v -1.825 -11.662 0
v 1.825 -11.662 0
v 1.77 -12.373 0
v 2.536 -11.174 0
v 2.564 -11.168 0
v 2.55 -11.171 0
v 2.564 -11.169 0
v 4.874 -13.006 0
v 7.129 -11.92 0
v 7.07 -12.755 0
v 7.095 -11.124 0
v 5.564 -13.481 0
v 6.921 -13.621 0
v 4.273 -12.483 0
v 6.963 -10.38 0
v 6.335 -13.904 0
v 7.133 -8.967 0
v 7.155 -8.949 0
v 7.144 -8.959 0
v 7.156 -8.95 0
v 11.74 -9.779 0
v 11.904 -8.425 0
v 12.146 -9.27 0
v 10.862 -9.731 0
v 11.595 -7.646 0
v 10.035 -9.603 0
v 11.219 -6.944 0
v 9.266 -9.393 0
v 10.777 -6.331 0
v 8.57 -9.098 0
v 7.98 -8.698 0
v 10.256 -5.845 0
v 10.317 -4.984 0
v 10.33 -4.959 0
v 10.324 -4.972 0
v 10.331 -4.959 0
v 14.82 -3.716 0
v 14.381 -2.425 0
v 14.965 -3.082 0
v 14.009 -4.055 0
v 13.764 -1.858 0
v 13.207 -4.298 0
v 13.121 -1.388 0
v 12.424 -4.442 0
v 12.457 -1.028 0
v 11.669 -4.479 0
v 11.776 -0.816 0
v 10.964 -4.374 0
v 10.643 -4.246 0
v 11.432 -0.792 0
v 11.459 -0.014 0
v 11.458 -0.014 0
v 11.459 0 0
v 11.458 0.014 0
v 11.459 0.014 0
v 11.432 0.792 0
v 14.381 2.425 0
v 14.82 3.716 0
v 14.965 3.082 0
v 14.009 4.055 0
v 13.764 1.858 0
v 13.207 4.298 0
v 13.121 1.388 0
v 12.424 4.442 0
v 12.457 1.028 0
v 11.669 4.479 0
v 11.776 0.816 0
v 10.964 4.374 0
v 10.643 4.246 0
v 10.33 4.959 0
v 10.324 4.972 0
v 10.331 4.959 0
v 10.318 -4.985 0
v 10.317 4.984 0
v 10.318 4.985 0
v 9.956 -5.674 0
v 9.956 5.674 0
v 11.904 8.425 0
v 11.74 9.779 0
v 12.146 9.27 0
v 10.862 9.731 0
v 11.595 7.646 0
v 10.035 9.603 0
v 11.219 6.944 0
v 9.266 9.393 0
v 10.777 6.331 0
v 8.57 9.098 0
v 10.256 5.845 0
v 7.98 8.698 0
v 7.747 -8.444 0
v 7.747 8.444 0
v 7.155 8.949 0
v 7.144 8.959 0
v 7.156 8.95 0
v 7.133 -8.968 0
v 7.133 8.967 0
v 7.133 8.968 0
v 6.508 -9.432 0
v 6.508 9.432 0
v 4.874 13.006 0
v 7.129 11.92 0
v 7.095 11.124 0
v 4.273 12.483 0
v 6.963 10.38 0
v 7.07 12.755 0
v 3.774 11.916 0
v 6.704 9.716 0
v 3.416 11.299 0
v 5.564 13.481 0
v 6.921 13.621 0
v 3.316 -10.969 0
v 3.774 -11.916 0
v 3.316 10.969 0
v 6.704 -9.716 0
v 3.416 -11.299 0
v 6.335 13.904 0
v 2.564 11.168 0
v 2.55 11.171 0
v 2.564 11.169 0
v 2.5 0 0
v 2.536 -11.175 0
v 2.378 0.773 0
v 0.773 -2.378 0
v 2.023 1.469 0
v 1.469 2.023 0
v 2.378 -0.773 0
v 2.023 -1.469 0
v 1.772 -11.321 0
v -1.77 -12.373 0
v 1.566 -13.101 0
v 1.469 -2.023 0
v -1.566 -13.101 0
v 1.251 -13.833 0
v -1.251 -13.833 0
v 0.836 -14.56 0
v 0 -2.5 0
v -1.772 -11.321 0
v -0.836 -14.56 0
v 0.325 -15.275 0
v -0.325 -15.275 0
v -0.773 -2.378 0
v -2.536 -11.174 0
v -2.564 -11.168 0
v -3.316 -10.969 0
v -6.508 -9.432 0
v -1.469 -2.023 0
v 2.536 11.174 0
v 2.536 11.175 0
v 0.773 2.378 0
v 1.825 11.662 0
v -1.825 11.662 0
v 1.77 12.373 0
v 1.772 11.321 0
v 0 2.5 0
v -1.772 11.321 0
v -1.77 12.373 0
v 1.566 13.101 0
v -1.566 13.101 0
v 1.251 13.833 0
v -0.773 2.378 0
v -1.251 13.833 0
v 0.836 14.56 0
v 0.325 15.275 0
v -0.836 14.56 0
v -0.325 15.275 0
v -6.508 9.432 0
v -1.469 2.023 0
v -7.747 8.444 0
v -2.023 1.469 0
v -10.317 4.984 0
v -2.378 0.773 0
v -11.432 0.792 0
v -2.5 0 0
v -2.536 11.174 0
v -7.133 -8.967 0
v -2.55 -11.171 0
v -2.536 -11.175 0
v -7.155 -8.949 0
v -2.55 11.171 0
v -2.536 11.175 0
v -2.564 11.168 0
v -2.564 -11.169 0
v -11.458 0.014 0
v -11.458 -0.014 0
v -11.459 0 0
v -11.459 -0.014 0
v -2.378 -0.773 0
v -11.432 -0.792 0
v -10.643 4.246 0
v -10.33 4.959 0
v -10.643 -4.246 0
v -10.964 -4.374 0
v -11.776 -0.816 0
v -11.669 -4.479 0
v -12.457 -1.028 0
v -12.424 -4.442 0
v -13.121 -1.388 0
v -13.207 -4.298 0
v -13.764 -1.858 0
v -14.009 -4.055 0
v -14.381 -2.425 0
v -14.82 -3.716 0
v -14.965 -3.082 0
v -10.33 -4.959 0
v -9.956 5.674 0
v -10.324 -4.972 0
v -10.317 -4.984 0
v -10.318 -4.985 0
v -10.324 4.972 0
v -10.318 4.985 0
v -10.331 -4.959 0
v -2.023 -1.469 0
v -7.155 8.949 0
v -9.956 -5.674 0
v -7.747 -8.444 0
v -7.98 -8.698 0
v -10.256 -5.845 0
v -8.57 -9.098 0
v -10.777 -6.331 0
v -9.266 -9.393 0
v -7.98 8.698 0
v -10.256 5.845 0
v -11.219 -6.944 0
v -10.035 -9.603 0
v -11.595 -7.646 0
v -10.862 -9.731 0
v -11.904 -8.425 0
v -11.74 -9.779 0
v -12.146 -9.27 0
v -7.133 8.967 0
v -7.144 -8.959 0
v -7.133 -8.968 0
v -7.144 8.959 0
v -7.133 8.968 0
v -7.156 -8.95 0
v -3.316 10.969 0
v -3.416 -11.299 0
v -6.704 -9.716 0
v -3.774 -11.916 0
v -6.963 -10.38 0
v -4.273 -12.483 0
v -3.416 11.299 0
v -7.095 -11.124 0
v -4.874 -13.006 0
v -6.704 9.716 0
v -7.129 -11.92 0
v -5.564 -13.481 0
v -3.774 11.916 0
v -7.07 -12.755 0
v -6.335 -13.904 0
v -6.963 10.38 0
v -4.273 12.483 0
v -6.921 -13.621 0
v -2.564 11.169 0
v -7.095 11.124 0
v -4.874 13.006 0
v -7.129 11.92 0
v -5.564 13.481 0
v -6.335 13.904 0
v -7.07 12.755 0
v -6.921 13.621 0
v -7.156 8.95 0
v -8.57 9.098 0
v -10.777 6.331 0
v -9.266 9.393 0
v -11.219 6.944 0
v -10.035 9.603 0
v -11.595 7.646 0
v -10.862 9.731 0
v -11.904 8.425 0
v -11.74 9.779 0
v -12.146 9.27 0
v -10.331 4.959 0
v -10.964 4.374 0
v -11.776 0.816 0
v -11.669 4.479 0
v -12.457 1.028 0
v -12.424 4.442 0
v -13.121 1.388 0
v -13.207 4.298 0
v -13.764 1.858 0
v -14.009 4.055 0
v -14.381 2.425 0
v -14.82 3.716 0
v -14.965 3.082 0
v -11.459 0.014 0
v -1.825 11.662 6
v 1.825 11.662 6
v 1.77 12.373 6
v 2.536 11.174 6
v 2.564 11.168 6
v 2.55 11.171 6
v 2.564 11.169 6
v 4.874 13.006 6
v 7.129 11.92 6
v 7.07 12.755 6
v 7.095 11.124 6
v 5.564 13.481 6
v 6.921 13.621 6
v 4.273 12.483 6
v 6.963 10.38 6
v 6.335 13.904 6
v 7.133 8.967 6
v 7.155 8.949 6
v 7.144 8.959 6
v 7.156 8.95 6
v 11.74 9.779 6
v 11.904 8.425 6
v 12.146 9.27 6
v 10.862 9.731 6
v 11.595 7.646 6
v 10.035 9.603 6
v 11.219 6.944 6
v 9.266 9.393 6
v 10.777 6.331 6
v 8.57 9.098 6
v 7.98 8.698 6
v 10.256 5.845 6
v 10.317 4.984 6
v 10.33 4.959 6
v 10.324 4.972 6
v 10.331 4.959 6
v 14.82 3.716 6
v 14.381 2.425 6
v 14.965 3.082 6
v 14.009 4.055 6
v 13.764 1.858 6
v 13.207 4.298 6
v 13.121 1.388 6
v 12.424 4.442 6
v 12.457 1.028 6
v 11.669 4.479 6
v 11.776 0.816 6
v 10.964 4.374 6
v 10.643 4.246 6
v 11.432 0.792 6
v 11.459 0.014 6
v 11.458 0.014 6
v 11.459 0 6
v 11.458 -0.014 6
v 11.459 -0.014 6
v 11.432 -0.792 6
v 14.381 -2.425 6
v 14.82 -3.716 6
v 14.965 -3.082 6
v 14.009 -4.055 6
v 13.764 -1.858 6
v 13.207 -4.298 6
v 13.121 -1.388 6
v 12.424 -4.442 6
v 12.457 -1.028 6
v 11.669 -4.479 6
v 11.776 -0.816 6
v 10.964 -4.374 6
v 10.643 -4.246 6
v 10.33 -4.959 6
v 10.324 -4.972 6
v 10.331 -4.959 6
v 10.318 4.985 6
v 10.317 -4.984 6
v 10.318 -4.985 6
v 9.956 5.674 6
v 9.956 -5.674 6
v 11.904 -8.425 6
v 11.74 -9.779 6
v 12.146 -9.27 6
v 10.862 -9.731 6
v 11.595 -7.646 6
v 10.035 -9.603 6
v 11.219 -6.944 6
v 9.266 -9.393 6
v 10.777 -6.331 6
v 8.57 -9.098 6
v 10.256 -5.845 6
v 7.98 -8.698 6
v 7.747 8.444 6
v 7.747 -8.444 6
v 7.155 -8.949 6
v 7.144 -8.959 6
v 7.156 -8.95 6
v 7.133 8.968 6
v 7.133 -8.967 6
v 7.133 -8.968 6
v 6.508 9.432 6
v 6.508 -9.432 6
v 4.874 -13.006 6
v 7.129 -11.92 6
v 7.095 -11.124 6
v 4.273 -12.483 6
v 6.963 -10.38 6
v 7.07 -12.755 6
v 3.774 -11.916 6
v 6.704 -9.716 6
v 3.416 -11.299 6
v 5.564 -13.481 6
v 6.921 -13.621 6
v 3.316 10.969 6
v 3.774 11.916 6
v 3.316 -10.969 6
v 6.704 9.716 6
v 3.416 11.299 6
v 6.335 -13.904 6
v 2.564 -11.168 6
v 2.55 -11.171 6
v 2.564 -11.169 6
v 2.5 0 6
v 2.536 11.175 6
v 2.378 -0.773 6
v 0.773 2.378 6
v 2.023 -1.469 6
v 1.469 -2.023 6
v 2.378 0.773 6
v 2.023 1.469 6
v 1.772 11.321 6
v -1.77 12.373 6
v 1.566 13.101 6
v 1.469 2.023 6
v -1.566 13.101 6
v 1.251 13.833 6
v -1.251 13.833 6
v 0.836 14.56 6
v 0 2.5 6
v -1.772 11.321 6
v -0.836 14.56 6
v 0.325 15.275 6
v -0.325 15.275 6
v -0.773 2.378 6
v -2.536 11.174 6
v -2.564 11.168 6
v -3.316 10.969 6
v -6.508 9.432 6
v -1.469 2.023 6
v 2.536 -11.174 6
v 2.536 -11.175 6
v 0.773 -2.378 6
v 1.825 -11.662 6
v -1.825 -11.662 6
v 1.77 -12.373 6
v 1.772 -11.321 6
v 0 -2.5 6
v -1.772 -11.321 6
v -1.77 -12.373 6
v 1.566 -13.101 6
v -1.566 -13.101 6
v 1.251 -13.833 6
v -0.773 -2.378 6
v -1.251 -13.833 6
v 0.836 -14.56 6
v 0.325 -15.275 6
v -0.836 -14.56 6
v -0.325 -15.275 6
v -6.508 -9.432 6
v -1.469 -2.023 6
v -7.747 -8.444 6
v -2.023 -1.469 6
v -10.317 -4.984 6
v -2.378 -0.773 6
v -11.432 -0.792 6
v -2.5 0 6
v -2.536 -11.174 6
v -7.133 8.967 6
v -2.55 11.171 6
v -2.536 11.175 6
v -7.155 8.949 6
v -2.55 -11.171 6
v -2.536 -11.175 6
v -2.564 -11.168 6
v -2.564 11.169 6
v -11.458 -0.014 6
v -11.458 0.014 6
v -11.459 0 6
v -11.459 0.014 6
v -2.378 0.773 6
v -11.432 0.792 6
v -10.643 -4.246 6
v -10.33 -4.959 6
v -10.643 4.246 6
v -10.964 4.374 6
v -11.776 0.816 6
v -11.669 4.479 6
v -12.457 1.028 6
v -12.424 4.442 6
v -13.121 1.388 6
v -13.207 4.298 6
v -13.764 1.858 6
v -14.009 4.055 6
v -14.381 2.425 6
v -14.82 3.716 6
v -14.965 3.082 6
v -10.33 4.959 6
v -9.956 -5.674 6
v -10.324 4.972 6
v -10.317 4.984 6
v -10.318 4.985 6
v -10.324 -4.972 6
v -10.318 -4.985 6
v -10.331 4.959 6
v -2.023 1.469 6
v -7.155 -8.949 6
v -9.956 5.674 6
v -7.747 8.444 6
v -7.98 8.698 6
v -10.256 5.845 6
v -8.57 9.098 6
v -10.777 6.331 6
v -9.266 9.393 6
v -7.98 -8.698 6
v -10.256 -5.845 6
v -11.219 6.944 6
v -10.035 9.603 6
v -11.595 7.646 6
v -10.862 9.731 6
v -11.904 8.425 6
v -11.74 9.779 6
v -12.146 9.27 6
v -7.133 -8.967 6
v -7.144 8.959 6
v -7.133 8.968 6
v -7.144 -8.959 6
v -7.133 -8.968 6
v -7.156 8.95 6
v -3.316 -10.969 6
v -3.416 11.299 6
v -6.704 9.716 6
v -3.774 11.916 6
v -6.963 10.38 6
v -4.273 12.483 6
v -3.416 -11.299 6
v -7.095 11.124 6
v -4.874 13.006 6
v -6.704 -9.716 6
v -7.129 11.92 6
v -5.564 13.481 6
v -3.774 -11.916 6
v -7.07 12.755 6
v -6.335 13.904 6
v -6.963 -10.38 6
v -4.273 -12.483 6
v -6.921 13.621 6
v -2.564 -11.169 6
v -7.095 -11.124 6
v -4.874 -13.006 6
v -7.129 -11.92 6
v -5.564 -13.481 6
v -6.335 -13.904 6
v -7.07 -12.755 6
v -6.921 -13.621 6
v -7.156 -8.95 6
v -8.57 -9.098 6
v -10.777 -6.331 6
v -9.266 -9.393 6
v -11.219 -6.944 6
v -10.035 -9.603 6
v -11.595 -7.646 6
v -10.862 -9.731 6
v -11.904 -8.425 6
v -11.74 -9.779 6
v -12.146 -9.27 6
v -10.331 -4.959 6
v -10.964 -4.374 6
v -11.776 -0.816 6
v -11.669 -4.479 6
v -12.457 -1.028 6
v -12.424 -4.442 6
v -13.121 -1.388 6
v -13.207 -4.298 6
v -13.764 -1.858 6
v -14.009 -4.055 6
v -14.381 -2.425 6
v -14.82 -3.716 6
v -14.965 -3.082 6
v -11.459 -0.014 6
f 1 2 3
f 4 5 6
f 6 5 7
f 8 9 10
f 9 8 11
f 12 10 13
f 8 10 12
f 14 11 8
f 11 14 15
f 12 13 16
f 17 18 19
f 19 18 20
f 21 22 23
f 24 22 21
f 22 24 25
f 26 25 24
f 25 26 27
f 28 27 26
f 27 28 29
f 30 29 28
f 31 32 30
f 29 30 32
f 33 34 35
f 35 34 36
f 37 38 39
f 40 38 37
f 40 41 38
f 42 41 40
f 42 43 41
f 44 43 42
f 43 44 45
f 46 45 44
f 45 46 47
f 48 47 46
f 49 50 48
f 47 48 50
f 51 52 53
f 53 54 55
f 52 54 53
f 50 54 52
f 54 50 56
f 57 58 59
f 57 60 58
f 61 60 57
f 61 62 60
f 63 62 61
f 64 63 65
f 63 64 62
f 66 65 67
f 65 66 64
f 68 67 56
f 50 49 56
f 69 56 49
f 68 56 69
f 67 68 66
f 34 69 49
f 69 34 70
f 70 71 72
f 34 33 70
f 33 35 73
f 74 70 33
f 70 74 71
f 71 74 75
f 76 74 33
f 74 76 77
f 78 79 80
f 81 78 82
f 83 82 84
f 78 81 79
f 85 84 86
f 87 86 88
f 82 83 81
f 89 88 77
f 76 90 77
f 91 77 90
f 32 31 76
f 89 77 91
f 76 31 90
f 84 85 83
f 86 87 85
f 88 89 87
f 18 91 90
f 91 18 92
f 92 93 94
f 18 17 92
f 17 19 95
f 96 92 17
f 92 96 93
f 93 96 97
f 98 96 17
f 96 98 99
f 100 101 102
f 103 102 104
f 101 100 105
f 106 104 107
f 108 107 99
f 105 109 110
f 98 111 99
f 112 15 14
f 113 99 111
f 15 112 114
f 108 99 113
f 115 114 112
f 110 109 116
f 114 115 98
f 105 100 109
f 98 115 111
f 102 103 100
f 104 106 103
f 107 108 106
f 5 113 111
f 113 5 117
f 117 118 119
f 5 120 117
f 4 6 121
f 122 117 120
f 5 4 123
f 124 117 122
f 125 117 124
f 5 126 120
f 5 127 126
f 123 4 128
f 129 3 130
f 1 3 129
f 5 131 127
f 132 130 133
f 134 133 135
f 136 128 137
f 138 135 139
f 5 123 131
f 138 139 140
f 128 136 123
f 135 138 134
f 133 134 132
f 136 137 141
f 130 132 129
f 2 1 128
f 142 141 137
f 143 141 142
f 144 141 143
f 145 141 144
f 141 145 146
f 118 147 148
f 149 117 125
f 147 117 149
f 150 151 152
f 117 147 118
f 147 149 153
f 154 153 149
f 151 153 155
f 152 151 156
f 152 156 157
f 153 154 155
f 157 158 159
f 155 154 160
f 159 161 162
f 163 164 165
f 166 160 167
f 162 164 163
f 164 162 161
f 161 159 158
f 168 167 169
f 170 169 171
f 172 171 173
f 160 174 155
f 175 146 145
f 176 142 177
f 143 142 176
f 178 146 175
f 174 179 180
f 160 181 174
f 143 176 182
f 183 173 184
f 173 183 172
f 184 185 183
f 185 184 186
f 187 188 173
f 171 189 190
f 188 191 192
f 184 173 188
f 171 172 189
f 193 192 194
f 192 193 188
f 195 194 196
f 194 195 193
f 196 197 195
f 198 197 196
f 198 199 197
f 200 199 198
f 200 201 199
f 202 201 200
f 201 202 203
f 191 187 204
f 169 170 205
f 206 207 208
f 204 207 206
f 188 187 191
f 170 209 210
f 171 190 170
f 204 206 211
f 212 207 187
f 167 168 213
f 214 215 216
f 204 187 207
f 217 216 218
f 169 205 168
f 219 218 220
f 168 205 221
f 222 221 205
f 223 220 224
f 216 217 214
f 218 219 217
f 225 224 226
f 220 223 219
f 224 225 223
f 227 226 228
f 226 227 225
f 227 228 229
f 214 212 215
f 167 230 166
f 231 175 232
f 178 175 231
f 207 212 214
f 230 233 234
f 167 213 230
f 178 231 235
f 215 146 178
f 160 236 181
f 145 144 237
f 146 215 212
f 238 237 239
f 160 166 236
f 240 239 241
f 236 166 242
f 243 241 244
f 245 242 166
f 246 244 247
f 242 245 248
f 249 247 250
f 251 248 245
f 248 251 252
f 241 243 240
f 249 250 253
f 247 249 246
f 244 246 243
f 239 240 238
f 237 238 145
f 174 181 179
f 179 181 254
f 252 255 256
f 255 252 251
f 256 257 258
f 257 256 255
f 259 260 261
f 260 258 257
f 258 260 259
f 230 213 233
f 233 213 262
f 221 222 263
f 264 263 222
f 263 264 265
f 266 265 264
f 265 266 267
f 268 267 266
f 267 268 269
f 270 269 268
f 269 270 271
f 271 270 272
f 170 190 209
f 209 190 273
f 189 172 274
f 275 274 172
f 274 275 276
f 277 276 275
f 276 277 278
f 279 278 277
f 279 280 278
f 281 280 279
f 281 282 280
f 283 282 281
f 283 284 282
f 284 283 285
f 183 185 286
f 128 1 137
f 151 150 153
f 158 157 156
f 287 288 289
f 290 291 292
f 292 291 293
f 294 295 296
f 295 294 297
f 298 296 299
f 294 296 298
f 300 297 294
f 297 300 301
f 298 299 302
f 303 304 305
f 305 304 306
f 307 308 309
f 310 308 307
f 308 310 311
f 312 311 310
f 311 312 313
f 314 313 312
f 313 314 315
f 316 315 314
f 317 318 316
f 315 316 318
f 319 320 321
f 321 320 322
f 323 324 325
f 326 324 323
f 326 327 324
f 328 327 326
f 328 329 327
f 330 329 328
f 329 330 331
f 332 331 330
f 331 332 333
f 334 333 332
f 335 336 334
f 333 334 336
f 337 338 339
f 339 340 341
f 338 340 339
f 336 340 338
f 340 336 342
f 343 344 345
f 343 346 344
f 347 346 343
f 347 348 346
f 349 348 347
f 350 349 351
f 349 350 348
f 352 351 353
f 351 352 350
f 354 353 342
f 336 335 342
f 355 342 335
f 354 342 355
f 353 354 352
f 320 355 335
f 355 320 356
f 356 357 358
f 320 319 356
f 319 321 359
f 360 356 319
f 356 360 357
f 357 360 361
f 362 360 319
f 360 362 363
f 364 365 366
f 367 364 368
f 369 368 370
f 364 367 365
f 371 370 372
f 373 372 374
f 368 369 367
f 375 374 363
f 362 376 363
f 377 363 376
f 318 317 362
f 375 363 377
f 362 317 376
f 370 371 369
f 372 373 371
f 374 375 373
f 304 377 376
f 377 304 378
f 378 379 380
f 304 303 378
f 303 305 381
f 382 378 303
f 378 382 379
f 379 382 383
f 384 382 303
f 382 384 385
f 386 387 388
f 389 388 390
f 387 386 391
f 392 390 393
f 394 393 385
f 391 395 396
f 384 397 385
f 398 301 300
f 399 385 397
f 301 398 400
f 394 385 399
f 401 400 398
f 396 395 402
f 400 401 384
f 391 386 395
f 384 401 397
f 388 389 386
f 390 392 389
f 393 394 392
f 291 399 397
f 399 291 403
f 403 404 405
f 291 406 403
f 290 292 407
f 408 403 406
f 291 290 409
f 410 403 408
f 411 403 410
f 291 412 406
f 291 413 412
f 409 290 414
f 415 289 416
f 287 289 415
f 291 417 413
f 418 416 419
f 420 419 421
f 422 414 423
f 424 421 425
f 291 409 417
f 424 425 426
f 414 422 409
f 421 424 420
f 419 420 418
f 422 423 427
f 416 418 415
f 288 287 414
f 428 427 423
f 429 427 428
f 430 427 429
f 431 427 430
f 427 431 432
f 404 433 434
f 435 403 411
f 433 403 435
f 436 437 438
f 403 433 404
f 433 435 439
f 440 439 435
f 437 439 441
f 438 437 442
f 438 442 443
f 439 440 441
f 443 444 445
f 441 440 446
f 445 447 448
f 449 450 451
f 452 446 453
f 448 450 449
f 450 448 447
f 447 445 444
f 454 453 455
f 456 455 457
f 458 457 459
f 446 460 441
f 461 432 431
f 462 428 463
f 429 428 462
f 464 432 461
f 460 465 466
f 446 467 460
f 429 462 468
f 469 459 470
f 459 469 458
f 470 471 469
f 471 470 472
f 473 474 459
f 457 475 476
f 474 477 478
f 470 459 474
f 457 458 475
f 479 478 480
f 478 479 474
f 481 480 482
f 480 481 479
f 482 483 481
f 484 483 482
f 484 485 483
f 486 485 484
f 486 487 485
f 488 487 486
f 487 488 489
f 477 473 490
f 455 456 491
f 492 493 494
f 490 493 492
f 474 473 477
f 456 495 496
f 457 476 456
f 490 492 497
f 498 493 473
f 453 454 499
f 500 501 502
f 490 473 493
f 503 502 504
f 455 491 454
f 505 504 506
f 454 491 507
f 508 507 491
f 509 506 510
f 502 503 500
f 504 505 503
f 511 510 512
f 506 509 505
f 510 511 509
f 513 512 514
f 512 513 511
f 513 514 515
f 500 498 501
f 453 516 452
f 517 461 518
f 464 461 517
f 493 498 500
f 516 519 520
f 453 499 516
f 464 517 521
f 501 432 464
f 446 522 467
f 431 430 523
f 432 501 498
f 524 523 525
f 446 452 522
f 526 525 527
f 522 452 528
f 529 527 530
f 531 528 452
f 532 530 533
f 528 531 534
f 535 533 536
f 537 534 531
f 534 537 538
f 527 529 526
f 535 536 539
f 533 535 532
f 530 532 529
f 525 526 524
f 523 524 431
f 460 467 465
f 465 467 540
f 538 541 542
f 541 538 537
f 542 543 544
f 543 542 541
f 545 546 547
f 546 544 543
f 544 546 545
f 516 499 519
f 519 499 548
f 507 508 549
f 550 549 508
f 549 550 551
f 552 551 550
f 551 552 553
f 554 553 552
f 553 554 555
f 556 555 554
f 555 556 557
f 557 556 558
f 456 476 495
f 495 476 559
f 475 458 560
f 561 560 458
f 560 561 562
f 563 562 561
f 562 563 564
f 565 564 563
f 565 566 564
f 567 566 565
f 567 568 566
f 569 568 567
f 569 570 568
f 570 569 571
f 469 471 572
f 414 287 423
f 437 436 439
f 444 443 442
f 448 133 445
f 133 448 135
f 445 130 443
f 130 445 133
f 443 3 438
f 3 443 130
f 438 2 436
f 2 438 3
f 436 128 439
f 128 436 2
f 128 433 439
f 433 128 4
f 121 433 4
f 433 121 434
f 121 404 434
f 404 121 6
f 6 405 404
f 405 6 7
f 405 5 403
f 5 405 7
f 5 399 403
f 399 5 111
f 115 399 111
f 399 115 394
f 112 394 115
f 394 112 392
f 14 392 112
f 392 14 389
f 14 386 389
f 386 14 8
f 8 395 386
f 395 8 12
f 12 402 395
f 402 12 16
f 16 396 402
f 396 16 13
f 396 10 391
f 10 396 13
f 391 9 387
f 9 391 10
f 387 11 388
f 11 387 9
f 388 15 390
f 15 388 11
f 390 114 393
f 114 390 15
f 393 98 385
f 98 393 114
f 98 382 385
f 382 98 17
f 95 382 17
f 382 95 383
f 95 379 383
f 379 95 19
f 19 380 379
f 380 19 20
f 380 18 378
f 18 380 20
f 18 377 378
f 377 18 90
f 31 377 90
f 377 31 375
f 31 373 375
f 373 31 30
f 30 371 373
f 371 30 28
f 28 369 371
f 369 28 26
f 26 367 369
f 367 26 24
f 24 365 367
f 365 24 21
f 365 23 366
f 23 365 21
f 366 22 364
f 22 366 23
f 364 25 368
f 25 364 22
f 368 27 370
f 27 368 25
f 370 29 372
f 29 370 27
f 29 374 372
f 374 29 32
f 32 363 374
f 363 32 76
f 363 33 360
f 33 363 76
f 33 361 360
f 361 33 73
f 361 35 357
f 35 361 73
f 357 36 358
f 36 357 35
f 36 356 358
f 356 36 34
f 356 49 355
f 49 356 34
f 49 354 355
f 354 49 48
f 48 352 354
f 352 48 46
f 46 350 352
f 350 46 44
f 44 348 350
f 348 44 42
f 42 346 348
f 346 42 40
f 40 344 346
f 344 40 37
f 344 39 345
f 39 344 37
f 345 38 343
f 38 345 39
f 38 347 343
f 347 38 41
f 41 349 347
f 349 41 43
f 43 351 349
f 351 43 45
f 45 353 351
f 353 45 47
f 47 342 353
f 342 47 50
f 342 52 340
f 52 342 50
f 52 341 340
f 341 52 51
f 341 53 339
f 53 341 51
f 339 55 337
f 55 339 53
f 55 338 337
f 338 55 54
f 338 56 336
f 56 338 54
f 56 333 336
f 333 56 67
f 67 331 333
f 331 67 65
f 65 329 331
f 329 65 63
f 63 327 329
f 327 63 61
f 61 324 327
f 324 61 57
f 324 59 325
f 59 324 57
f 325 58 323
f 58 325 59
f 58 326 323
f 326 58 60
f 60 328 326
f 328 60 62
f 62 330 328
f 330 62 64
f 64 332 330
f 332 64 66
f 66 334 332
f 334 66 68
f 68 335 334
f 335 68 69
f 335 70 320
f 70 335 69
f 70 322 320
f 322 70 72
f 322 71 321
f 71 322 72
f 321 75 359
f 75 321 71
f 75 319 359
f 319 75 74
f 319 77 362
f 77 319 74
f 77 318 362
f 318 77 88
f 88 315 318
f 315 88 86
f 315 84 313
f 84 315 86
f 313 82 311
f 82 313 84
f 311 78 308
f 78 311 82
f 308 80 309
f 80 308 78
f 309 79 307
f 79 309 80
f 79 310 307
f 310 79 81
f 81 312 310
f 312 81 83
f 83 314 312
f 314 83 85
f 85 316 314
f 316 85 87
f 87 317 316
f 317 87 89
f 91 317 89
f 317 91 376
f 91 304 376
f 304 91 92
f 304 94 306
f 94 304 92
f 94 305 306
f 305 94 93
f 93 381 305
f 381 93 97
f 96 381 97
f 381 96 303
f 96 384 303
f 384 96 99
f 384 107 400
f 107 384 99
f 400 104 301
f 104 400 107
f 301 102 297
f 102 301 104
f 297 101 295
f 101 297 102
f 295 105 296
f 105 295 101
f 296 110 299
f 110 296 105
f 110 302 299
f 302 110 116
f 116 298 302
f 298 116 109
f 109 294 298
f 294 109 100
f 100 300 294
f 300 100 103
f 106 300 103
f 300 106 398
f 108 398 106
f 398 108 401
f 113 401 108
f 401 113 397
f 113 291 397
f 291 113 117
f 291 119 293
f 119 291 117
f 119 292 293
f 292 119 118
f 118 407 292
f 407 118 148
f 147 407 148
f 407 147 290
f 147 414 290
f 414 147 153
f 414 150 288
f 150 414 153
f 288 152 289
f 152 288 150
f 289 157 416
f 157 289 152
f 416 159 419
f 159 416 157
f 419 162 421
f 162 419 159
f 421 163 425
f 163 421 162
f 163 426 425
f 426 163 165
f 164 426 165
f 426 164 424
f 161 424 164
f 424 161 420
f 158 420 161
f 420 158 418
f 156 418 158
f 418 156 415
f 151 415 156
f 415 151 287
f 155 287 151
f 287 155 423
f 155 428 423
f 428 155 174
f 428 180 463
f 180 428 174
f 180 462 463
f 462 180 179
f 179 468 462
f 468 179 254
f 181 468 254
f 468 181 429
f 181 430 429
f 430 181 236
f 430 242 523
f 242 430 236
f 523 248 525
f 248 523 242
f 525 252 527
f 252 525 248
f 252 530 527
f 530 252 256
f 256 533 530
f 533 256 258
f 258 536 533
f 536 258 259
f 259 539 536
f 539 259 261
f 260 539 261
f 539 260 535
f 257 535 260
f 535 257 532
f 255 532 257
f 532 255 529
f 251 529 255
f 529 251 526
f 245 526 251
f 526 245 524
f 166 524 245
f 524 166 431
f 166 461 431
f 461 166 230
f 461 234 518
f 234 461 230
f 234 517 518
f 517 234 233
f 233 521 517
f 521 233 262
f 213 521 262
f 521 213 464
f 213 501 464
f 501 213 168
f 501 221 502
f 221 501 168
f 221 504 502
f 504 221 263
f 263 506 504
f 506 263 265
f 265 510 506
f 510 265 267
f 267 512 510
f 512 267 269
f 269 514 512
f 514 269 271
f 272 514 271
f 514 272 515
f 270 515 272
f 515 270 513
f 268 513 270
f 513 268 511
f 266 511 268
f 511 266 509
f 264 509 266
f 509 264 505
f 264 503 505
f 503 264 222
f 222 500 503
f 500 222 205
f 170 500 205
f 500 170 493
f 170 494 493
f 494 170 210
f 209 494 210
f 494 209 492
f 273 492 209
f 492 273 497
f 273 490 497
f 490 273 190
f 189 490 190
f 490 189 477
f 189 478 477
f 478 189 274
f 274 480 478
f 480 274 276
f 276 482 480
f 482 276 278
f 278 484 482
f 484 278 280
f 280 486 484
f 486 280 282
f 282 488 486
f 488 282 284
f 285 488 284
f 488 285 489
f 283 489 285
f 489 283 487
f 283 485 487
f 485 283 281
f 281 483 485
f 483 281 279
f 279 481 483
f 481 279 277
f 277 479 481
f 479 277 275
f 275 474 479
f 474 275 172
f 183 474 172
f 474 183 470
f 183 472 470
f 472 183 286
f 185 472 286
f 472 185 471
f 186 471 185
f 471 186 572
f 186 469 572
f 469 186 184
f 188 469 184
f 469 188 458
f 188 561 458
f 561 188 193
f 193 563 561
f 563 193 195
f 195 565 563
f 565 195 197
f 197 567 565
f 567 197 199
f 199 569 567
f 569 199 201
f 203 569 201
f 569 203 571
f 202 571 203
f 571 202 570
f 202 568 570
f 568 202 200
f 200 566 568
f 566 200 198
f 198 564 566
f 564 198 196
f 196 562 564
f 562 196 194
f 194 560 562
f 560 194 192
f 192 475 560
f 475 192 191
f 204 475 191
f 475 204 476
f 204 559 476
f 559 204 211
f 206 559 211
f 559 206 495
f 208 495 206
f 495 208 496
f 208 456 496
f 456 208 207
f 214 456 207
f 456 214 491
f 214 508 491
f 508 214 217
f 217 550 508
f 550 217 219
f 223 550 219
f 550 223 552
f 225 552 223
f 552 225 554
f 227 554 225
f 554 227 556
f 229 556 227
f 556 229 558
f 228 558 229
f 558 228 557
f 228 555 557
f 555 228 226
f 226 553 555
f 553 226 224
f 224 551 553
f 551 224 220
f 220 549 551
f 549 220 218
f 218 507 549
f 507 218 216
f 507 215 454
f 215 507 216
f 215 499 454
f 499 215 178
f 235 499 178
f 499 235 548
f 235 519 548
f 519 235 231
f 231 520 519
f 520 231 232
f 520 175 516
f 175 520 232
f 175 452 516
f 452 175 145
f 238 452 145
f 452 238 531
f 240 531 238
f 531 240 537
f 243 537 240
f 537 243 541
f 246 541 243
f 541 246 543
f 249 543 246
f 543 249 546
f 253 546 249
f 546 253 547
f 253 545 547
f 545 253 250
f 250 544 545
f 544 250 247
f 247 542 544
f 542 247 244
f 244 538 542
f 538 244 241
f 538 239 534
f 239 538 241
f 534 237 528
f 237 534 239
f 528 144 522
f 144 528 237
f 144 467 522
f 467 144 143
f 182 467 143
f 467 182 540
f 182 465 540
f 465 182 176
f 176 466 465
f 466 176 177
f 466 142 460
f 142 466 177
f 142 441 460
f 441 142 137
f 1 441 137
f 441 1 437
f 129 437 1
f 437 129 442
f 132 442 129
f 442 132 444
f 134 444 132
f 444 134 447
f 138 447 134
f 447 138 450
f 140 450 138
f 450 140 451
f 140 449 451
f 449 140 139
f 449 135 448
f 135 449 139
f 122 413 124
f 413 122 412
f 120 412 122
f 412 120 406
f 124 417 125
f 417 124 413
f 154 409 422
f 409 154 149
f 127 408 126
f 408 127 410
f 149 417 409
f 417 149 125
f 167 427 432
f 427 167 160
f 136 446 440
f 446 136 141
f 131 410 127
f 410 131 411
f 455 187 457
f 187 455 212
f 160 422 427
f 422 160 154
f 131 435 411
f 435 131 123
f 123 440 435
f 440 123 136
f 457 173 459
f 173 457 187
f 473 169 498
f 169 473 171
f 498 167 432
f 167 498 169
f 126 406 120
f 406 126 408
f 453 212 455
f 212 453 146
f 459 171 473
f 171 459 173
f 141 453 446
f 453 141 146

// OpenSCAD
//////////////////////////////////////////////////////////////////////////////////////////////
// Public Domain Parametric Involute Spur Gear (and involute helical gear and involute rack)
// version 1.1
// by Leemon Baird, 2011, Leemon@Leemon.com
//http://www.thingiverse.com/thing:5505
//
// This file is public domain.  Use it for any purpose, including commercial
// applications.  Attribution would be nice, but is not required.  There is
// no warranty of any kind, including its correctness, usefulness, or safety.
// 
// This is parameterized involute spur (or helical) gear.  It is much simpler and less powerful than
// others on Thingiverse.  But it is public domain.  I implemented it from scratch from the 
// descriptions and equations on Wikipedia and the web, using Mathematica for calculations and testing,
// and I now release it into the public domain.
//
//		http://en.wikipedia.org/wiki/Involute_gear
//		http://en.wikipedia.org/wiki/Gear
//		http://en.wikipedia.org/wiki/List_of_gear_nomenclature
//		http://gtrebaol.free.fr/doc/catia/spur_gear.html
//		http://www.cs.cmu.edu/~rapidproto/mechanisms/chpt7.html
//
// The module gear() gives an involute spur gear, with reasonable defaults for all the parameters.
// Normally, you should just choose the first 4 parameters, and let the rest be default values.
// The module gear() gives a gear in the XY plane, centered on the origin, with one tooth centered on
// the positive Y axis.  The various functions below it take the same parameters, and return various
// measurements for the gear.  The most important is pitch_radius, which tells how far apart to space
// gears that are meshing, and adendum_radius, which gives the size of the region filled by the gear.
// A gear has a "pitch circle", which is an invisible circle that cuts through the middle of each
// tooth (though not the exact center). In order for two gears to mesh, their pitch circles should 
// just touch.  So the distance between their centers should be pitch_radius() for one, plus pitch_radius() 
// for the other, which gives the radii of their pitch circles.
//
// In order for two gears to mesh, they must have the same mm_per_tooth and pressure_angle parameters.  
// mm_per_tooth gives the number of millimeters of arc around the pitch circle covered by one tooth and one
// space between teeth.  The pitch angle controls how flat or bulged the sides of the teeth are.  Common
// values include 14.5 degrees and 20 degrees, and occasionally 25.  Though I've seen 28 recommended for
// plastic gears. Larger numbers bulge out more, giving stronger teeth, so 28 degrees is the default here.
//
// The ratio of number_of_teeth for two meshing gears gives how many times one will make a full 
// revolution when the the other makes one full revolution.  If the two numbers are coprime (i.e. 
// are not both divisible by the same number greater than 1), then every tooth on one gear
// will meet every tooth on the other, for more even wear.  So coprime numbers of teeth are good.
//
// The module rack() gives a rack, which is a bar with teeth.  A rack can mesh with any
// gear that has the same mm_per_tooth and pressure_angle.
//
// Some terminology: 
// The outline of a gear is a smooth circle (the "pitch circle") which has mountains and valleys
// added so it is toothed.  So there is an inner circle (the "root circle") that touches the 
// base of all the teeth, an outer circle that touches the tips of all the teeth,
// and the invisible pitch circle in between them.  There is also a "base circle", which can be smaller than
// all three of the others, which controls the shape of the teeth.  The side of each tooth lies on the path 
// that the end of a string would follow if it were wrapped tightly around the base circle, then slowly unwound.  
// That shape is an "involute", which gives this type of gear its name.
//
//////////////////////////////////////////////////////////////////////////////////////////////

//An involute spur gear, with reasonable defaults for all the parameters.
//Normally, you should just choose the first 4 parameters, and let the rest be default values.
//Meshing gears must match in mm_per_tooth, pressure_angle, and twist,
//and be separated by the sum of their pitch radii, which can be found with pitch_radius().
module gear (
	mm_per_tooth    = 3,    //this is the "circular pitch", the circumference of the pitch circle divided by the number of teeth
	number_of_teeth = 11,   //total number of teeth around the entire perimeter
	thickness       = 6,    //thickness of gear in mm
	hole_diameter   = 3,    //diameter of the hole in the center, in mm
	twist           = 0,    //teeth rotate this many degrees from bottom of gear to top.  360 makes the gear a screw with each thread going around once
	teeth_to_hide   = 0,    //number of teeth to delete to make this only a fraction of a circle
	pressure_angle  = 28,   //Controls how straight or bulged the tooth sides are. In degrees.
	clearance       = 0.0,  //gap between top of a tooth on one gear and bottom of valley on a meshing gear (in millimeters)
	backlash        = 0.0,   //gap between two meshing teeth, in the direction along the circumference of the pitch circle
    center = false,   // center gear by z axis
    $fn = 20   // number of fragments to draw hole cylinder
) {
	p  = mm_per_tooth * number_of_teeth / PI / 2;  //radius of pitch circle
	c  = p + mm_per_tooth / PI - clearance;        //radius of outer circle
	b  = p*cos(pressure_angle);                    //radius of base circle
	r  = p-(c-p)-clearance;                        //radius of root circle
	t  = mm_per_tooth/2-backlash/2;                //tooth thickness at pitch circle
	k  = -iang(b, p) - t/2/p/PI*180;             //angle to where involute meets base circle on each side of tooth
    difference() {
        linear_extrude(height = thickness, center = center, convexity = 10, twist = twist)
            for (i = [0:(number_of_teeth-teeth_to_hide-1 > 0 ? 1 : -1):number_of_teeth-teeth_to_hide-1] )
                rotate([0,0,i*360/number_of_teeth])
                    polygon(
                        points=[
                            [0, -hole_diameter/10],
                            polar(r, -181/number_of_teeth),
                            polar(r, r<b ? k : -180/number_of_teeth),
                            q7(0/5,r,b,c,k, 1),q7(1/5,r,b,c,k, 1),q7(2/5,r,b,c,k, 1),q7(3/5,r,b,c,k, 1),q7(4/5,r,b,c,k, 1),q7(5/5,r,b,c,k, 1),
                            q7(5/5,r,b,c,k,-1),q7(4/5,r,b,c,k,-1),q7(3/5,r,b,c,k,-1),q7(2/5,r,b,c,k,-1),q7(1/5,r,b,c,k,-1),q7(0/5,r,b,c,k,-1),
                            polar(r, r<b ? -k : 180/number_of_teeth),
                            polar(r, 181/number_of_teeth)
                        ],
                        paths=[[0,1,2,3,4,5,6,7,8,9,10,11,12,13,14,15,16]]
                    );
        translate([0,0, (center ? 0 : -0.1)])
            cylinder(h=thickness+0.2, r=hole_diameter/2, center=center, $fn=$fn);
    }
};	
//these 4 functions are used by gear
function polar(r,theta)   = r*[sin(theta), cos(theta)];                            //convert polar to cartesian coordinates
function iang(r1,r2)      = sqrt((r2/r1)*(r2/r1) - 1)/PI*180 - acos(r1/r2); //unwind a string this many degrees to go from radius r1 to radius r2
function q7(f,r,b,r2,t,s) = q6(b,s,t,(1-f)*max(b,r)+f*r2);                         //radius a fraction f up the curved side of the tooth 
function q6(b,s,t,d)      = polar(d,s*(iang(b,d)+t));                              //point at radius d on the involute curve

//a rack, which is a straight line with teeth (the same as a segment from a giant gear with a huge number of teeth).
//The "pitch circle" is a line along the X axis.
module rack (
	mm_per_tooth    = 3,    //this is the "circular pitch", the circumference of the pitch circle divided by the number of teeth
	number_of_teeth = 11,   //total number of teeth along the rack
	thickness       = 6,    //thickness of rack in mm (affects each tooth)
	height          = 120,   //height of rack in mm, from tooth top to far side of rack.
	pressure_angle  = 28,   //Controls how straight or bulged the tooth sides are. In degrees.
	backlash        = 0.0,   //gap between two meshing teeth, in the direction along the circumference of the pitch circle
    center = false,   // center rack by z axis
) {
	a = mm_per_tooth / PI; //addendum
	t = a*cos(pressure_angle)-mm_per_tooth/10;         //tooth side is tilted so top/bottom corners move this amount
	linear_extrude(height = thickness, center = center, convexity = 10)
		for (i = [0:number_of_teeth-1] )
			translate([i*mm_per_tooth,0,0])
					polygon(
						points=[
							[-mm_per_tooth * 3/4,                 a-height],
							[-mm_per_tooth * 3/4 - backlash,     -a],
							[-mm_per_tooth * 1/4 + backlash - t, -a],
							[-mm_per_tooth * 1/4 + backlash + t,  a],
							[ mm_per_tooth * 1/4 - backlash - t,  a],
							[ mm_per_tooth * 1/4 - backlash + t, -a],
							[ mm_per_tooth * 3/4 + backlash,     -a],
							[ mm_per_tooth * 3/4,                 a-height],
						],
						paths=[[0,1,2,3,4,5,6,7]]
					);
};	

//These 5 functions let the user find the derived dimensions of the gear.
//A gear fits within a circle of radius outer_radius, and two gears should have
//their centers separated by the sum of their pictch_radius.
function circular_pitch  (mm_per_tooth=3) = mm_per_tooth;                     //tooth density expressed as "circular pitch" in millimeters
function diametral_pitch (mm_per_tooth=3) = PI / mm_per_tooth;         //tooth density expressed as "diametral pitch" in teeth per millimeter
function module_value    (mm_per_tooth=3) = mm_per_tooth / PI;                //tooth density expressed as "module" or "modulus" in millimeters
function pitch_radius    (mm_per_tooth=3,number_of_teeth=11) = mm_per_tooth * number_of_teeth / PI / 2;
function outer_radius    (mm_per_tooth=3,number_of_teeth=11,clearance=0.1)    //The gear fits entirely within a cylinder of this radius.
	= mm_per_tooth*(1+number_of_teeth/2)/PI  - clearance;              

//////////////////////////////////////////////////////////////////////////////////////////////
//example gear train.  
//Try it with OpenSCAD View/Animate command with 20 steps and 24 FPS.
//The gears will continue to be rotated to mesh correctly if you change the number of teeth.


// single-gear instantiation (real Leemon Baird involute code above)
gear(mm_per_tooth=6, number_of_teeth=14, thickness=6, hole_diameter=5);
